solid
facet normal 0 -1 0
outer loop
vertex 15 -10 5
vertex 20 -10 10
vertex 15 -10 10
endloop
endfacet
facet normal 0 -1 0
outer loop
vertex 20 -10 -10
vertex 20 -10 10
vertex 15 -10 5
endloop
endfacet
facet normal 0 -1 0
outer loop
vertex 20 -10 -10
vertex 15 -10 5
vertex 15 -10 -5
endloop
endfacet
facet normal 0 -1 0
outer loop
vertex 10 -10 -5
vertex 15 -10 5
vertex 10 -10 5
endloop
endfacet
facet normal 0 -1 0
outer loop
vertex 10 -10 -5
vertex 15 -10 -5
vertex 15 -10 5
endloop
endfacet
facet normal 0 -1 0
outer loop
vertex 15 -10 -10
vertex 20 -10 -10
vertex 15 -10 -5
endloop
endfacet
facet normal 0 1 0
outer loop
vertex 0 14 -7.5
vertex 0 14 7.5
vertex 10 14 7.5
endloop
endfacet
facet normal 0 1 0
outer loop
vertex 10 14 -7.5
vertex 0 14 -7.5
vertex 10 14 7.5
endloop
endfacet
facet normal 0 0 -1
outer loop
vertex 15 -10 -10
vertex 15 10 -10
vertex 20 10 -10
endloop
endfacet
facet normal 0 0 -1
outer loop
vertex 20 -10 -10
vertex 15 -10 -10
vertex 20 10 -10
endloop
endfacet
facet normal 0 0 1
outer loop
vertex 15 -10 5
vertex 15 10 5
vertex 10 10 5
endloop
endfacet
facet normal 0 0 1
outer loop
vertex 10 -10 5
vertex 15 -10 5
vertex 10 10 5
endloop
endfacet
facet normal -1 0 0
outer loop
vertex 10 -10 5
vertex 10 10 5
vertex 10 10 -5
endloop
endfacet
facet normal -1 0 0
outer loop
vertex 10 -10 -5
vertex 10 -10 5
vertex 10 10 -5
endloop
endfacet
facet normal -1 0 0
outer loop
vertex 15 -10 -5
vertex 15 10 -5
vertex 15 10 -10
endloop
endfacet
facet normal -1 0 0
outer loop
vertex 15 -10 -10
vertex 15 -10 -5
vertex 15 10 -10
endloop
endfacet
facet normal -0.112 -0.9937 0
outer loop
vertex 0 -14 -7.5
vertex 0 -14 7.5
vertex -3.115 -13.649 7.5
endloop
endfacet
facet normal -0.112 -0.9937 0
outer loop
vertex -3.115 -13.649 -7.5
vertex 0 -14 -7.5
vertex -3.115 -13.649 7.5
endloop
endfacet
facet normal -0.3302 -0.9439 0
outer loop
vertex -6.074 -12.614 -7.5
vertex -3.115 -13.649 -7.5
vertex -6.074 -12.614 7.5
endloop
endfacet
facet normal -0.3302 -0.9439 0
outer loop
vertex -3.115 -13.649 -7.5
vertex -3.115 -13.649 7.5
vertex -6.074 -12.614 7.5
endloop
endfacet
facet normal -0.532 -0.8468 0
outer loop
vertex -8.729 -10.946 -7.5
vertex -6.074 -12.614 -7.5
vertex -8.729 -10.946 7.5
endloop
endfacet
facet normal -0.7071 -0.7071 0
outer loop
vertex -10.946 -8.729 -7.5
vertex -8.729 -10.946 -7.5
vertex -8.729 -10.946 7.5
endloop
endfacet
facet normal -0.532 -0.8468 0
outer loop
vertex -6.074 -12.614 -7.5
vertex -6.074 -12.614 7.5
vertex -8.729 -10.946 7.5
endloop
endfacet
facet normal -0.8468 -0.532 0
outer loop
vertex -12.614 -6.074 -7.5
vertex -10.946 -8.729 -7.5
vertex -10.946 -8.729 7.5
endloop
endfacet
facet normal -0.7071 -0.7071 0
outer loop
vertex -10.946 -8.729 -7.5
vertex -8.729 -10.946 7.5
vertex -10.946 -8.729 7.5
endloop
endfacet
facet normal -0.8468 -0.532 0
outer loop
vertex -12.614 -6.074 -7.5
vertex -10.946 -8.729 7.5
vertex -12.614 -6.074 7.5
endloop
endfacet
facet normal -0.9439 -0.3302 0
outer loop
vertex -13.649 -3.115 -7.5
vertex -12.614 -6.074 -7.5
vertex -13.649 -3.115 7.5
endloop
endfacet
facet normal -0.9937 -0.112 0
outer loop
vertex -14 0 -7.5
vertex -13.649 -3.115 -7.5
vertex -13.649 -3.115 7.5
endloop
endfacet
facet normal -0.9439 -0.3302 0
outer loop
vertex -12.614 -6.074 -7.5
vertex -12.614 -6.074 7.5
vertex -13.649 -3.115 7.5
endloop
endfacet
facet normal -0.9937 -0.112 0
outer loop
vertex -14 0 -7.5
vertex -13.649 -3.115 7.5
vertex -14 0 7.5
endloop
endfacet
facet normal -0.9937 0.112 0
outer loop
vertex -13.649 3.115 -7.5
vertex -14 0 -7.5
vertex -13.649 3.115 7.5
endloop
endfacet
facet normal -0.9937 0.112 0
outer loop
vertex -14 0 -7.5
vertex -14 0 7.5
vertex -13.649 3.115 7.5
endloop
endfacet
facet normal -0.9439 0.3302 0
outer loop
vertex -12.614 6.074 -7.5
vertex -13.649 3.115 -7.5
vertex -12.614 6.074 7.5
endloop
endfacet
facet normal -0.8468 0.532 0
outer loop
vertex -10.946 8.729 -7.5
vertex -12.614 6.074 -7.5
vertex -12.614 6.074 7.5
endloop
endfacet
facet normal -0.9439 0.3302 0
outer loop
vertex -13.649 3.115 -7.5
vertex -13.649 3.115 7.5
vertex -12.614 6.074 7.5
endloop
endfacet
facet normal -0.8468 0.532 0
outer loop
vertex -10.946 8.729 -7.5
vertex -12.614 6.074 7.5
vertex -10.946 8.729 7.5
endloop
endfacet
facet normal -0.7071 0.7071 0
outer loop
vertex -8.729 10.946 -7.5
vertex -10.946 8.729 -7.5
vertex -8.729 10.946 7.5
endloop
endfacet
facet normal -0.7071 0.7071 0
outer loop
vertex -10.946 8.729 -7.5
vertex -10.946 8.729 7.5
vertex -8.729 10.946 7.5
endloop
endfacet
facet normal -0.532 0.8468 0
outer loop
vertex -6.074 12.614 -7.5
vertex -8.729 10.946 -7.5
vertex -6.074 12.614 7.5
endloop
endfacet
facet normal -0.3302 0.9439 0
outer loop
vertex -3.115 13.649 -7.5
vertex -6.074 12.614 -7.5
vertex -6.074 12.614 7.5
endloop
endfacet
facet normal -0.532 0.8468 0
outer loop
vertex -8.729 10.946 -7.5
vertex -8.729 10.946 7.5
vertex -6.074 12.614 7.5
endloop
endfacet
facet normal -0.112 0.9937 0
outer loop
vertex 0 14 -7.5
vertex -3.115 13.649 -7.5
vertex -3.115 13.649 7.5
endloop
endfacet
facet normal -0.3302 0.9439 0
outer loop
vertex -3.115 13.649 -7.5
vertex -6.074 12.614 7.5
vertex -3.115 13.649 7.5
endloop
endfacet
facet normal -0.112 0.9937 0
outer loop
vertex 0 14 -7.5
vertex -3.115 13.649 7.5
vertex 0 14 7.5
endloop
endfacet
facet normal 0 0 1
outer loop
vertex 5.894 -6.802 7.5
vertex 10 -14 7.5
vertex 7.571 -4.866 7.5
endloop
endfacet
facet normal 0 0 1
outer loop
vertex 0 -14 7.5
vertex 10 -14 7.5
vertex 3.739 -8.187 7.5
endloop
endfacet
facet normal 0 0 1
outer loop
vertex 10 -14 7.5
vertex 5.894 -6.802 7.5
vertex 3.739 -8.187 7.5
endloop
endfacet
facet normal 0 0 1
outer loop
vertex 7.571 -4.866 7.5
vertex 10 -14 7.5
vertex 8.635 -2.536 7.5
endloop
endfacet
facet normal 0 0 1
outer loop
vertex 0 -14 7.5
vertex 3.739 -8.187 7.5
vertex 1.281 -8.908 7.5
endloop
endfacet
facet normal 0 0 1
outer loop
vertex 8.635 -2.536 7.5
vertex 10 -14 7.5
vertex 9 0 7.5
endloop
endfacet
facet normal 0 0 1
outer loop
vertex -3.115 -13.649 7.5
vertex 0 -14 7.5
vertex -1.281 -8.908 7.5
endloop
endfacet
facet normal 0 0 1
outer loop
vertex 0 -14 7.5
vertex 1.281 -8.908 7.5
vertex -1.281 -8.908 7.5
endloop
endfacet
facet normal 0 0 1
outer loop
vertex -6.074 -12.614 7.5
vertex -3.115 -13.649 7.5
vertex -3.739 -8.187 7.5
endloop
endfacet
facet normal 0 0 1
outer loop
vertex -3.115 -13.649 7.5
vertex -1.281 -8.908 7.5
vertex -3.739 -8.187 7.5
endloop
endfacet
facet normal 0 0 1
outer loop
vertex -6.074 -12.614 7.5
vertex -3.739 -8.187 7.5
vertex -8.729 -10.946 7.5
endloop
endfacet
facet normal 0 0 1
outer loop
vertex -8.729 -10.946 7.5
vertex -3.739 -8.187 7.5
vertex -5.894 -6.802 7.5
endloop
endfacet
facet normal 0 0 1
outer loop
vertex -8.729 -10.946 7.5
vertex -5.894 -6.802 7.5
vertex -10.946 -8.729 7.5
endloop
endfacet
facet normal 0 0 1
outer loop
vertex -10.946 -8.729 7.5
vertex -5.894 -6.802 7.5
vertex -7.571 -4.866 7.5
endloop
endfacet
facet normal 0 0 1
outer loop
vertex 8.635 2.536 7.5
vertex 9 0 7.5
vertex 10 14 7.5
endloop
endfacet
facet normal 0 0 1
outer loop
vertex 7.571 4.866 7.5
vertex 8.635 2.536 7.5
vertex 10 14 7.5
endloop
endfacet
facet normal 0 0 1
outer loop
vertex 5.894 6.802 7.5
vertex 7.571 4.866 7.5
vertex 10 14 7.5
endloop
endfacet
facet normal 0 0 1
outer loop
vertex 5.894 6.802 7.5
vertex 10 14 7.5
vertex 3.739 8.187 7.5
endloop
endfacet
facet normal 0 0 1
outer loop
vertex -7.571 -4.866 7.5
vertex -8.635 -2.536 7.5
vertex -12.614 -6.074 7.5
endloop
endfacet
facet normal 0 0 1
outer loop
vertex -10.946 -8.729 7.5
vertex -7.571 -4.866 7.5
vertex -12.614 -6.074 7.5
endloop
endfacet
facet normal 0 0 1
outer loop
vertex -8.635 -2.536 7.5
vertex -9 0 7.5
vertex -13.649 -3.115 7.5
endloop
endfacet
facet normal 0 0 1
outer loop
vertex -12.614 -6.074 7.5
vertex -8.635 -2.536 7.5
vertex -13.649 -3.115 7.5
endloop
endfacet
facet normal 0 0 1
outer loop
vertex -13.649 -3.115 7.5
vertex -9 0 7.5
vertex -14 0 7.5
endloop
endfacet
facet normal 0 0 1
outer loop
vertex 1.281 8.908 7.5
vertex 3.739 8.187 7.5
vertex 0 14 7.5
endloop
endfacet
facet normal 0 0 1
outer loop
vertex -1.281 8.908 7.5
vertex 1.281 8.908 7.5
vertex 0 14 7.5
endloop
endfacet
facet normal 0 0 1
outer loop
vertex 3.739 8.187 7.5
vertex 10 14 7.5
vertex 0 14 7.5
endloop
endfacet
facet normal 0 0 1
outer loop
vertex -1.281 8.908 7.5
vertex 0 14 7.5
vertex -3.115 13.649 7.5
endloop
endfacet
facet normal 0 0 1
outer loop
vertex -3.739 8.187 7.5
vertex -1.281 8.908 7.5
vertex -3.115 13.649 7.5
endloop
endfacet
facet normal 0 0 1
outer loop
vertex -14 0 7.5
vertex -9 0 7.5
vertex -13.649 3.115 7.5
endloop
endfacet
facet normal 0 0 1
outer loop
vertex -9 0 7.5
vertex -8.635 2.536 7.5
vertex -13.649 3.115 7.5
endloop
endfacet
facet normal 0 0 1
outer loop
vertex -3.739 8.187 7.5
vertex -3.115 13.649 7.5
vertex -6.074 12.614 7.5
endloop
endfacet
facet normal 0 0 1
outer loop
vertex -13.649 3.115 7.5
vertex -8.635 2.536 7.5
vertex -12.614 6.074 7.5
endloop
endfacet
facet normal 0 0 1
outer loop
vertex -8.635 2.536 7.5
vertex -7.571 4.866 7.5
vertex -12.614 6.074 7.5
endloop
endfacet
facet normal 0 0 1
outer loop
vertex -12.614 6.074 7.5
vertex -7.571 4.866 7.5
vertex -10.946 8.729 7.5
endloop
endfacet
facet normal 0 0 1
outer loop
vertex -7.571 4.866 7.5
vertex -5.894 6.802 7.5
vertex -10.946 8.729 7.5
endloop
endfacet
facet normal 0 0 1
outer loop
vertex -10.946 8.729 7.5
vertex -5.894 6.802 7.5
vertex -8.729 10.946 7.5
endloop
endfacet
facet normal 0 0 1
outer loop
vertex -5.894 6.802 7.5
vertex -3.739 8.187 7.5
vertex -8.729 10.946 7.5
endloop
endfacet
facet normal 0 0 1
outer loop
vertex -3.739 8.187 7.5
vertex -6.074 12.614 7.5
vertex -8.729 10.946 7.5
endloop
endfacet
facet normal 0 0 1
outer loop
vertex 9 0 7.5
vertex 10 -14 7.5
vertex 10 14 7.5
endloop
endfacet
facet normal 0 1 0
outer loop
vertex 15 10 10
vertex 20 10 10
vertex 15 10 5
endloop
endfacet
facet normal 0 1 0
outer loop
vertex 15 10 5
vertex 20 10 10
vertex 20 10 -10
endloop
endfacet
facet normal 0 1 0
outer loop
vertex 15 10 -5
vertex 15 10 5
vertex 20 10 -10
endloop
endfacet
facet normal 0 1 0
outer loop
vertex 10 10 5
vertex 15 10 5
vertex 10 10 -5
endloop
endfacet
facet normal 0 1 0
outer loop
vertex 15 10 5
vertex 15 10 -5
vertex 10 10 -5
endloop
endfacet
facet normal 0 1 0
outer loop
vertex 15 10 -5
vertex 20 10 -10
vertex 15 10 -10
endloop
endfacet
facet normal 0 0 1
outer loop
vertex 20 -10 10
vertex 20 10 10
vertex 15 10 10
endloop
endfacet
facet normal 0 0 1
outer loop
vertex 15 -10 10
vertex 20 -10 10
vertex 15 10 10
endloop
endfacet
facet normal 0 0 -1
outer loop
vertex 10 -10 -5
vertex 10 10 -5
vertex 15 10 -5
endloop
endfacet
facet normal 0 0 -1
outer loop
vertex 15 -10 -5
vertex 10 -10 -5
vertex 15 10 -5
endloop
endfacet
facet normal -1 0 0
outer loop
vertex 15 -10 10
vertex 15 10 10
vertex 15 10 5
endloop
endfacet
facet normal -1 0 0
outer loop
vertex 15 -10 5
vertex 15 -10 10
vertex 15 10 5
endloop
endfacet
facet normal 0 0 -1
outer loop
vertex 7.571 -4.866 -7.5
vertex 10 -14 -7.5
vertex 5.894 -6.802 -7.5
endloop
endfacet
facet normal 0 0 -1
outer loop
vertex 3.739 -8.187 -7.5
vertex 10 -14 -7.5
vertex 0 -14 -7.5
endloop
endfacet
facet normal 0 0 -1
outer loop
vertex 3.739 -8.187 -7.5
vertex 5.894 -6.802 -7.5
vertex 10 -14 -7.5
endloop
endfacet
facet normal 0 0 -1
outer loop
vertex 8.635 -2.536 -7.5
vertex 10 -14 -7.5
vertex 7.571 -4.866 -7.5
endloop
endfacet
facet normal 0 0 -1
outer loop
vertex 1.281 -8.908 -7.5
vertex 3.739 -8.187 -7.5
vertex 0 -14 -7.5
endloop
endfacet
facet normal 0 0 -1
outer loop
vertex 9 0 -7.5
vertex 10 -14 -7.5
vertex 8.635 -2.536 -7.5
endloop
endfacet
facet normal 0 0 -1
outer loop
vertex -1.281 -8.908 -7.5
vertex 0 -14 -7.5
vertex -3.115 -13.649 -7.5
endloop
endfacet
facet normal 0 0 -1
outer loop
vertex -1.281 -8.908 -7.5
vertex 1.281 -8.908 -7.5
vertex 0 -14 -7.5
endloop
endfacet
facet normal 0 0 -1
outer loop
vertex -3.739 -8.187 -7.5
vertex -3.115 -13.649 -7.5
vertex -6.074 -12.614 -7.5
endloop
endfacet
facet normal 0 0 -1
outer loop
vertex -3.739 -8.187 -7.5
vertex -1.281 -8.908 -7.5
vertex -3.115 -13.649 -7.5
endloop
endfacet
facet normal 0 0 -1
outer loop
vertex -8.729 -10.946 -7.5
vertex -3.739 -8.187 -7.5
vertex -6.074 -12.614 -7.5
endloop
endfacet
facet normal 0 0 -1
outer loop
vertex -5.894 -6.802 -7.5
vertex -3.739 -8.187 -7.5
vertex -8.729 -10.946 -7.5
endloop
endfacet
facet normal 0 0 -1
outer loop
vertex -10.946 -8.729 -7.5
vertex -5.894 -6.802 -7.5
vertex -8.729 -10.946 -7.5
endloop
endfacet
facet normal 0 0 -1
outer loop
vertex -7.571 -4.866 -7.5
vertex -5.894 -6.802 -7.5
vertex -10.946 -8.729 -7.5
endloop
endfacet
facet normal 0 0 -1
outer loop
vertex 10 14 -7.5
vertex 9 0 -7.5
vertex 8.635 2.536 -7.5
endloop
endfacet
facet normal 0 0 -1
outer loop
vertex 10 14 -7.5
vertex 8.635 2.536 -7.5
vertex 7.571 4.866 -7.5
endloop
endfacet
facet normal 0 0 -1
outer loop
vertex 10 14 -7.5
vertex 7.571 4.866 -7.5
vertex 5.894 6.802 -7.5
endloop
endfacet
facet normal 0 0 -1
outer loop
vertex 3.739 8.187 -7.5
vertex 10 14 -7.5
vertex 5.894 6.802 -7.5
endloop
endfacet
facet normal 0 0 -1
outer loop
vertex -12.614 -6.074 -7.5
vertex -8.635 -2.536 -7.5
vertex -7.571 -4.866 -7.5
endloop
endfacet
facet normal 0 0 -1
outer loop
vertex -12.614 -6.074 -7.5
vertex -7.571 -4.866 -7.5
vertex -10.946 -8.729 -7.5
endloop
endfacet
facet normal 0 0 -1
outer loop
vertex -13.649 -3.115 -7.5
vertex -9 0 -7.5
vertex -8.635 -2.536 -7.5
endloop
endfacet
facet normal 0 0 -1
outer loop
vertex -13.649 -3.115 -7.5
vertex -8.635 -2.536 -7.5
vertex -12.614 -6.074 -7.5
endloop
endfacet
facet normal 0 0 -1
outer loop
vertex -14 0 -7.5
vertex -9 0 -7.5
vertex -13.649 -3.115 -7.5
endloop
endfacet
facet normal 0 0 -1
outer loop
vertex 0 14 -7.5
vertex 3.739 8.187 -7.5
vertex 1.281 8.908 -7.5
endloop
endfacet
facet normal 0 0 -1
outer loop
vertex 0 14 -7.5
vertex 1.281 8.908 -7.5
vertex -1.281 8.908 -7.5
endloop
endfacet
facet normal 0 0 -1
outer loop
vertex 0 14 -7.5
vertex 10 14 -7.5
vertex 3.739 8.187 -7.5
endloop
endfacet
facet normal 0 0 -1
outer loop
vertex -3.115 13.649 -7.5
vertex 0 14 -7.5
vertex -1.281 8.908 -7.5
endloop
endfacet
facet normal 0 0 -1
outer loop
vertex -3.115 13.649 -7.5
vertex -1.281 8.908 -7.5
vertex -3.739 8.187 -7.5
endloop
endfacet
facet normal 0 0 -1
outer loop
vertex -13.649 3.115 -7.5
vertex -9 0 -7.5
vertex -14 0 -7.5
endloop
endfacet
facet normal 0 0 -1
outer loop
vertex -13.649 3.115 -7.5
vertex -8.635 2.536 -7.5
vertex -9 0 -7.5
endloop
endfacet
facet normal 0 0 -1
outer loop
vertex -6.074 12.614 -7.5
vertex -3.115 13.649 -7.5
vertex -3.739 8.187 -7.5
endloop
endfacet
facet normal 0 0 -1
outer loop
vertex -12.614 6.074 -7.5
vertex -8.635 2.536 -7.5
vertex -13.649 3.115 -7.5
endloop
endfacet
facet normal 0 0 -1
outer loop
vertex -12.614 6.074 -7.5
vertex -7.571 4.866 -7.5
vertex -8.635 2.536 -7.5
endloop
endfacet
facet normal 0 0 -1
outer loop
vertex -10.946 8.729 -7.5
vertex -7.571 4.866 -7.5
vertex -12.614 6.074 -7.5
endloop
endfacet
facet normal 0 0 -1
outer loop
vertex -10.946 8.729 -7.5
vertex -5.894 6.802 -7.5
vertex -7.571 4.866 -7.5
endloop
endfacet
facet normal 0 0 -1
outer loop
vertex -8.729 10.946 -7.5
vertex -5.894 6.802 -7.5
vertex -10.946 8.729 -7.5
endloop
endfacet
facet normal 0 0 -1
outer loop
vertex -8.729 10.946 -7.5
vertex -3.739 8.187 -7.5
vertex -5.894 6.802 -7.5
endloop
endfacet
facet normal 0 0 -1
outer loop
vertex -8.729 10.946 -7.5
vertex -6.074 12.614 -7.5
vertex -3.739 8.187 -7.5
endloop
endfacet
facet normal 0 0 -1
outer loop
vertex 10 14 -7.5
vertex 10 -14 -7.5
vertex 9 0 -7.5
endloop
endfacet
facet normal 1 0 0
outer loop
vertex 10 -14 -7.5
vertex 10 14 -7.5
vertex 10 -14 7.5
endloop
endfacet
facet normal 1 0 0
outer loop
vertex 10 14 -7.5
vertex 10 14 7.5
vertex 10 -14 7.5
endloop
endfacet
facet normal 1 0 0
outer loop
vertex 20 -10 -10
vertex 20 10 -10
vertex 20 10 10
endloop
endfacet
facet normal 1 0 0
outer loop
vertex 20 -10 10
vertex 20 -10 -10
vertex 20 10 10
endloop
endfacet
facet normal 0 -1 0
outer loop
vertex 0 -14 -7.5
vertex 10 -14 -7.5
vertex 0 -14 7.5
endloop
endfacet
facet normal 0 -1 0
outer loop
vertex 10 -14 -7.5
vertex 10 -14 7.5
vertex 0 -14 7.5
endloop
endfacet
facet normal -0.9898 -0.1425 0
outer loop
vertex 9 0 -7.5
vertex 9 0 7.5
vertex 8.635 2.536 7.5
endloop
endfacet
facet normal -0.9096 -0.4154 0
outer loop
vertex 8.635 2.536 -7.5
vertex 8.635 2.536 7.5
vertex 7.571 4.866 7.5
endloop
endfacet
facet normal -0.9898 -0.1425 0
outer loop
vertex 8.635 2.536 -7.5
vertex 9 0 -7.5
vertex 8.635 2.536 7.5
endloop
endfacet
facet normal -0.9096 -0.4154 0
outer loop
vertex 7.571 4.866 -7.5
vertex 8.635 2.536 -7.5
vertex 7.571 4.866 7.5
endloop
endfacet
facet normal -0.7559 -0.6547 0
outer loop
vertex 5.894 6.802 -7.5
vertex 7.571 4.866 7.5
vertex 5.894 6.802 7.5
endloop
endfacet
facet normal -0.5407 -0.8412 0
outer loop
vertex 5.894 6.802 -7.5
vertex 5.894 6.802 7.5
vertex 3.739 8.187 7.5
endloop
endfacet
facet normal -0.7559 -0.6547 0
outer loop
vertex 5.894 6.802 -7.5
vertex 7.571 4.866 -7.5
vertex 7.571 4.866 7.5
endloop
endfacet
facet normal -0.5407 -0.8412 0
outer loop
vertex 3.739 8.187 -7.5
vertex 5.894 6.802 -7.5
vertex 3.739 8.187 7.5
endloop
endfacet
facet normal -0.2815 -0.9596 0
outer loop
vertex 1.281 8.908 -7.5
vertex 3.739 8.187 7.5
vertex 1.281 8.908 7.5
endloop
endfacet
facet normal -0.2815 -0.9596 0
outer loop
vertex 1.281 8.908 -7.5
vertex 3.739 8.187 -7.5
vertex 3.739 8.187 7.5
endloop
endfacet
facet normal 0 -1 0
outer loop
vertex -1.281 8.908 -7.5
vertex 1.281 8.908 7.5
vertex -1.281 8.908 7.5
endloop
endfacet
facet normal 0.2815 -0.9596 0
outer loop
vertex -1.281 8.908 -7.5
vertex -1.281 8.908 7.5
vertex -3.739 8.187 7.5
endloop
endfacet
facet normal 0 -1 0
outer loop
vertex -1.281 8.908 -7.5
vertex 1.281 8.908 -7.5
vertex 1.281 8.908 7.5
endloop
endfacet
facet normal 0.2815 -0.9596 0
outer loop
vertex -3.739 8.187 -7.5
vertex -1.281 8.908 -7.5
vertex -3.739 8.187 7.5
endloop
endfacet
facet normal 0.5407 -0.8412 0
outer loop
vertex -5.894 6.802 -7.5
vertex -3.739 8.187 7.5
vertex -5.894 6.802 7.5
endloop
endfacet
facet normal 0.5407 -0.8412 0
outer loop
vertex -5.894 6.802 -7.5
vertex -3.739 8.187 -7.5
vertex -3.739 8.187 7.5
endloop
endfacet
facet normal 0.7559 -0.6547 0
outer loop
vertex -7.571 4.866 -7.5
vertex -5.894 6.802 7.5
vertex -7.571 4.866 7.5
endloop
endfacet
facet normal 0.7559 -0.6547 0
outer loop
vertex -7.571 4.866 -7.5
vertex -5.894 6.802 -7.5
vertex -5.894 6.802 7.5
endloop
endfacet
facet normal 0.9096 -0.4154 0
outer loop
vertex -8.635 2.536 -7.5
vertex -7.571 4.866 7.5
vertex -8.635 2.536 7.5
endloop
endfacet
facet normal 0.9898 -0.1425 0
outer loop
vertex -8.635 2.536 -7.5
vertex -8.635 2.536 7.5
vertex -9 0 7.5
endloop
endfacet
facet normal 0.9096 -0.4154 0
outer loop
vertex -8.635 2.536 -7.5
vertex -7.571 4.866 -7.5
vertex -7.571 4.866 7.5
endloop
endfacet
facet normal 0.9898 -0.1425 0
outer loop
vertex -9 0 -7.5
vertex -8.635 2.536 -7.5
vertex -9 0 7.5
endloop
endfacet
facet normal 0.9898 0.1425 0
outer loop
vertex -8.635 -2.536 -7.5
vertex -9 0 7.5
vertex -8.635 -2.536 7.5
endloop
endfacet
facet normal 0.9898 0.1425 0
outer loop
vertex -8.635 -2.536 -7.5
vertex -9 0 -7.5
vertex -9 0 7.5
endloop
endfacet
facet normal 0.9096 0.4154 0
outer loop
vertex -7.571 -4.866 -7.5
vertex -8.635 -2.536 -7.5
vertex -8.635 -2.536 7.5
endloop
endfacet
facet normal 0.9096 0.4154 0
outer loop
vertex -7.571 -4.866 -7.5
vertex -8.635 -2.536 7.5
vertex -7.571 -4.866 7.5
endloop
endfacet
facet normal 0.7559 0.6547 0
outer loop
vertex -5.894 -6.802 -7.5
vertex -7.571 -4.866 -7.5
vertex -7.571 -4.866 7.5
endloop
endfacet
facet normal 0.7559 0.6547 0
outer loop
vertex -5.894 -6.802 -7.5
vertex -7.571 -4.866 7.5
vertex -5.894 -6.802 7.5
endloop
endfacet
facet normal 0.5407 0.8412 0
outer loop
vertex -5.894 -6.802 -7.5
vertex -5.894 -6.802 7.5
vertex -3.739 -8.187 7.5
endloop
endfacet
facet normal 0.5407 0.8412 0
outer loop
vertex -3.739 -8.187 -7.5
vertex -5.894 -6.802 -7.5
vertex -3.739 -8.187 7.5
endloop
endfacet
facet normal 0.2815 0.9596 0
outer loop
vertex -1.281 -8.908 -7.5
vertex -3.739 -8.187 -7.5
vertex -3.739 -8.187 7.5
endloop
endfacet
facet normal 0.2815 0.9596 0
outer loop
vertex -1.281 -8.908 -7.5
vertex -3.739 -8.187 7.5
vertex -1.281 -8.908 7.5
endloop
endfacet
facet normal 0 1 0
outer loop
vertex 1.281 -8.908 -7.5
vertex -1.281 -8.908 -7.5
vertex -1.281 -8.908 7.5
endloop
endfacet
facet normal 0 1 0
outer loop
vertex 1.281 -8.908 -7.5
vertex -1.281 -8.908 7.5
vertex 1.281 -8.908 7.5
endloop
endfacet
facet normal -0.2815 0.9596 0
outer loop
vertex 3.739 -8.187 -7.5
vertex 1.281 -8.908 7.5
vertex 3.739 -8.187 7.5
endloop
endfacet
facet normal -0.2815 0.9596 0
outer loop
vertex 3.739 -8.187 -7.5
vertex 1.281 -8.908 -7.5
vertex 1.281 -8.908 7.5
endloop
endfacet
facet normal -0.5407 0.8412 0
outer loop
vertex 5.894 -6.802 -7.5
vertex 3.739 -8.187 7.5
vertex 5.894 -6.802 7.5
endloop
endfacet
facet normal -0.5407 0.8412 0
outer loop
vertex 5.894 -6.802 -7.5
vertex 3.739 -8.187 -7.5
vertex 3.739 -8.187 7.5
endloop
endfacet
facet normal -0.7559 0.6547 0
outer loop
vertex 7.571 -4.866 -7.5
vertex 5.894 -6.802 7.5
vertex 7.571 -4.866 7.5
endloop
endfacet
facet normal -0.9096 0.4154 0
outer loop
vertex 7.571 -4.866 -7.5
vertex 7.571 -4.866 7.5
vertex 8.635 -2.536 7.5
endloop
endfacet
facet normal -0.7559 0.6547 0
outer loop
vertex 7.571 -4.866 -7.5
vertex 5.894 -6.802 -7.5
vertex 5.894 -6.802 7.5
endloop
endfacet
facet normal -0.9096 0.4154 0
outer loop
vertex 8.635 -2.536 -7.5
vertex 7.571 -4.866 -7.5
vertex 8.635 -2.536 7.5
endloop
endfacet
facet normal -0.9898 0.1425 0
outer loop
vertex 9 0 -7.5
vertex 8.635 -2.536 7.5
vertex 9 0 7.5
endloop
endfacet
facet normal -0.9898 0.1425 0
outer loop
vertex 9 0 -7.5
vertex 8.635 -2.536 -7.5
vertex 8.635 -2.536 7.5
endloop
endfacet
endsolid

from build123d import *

# Parameters (mm, degrees)
ESQUISSE1_R        = 9
BOSS_EXTRU_1_DEPTH = 7.5
BOSS_EXTRU_2_START = -4
BOSS_EXTRU_2_DEPTH = 20


with BuildPart() as part:
    # Esquisse1 → Boss.-Extru.1 (new body, symmetric)
    with BuildSketch(Plane.XY):
        with BuildLine():
            Line((0, 14), (10, 14))
            Line((10, 14), (10, -14))
            Line((10, -14), (0, -14))
            ThreePointArc((0, -14), (-14, 0), (0, 14))
        make_face()
        Circle(ESQUISSE1_R, mode=Mode.SUBTRACT)
    extrude(amount=BOSS_EXTRU_1_DEPTH, both=True)


with BuildPart() as body_2:
    # Esquisse2 → Boss.-Extru.2 (new body)
    with BuildSketch(Plane(origin=(0, 14, 0), x_dir=(1, 0, 0), z_dir=(0, 1, 0)).offset(BOSS_EXTRU_2_START)):
        Polygon((10, 5), (15, 5), (15, 10), (20, 10), (20, -10), (15, -10), (15, -5), (10, -5), align=None)
    extrude(amount=-BOSS_EXTRU_2_DEPTH)


solid = Compound([part.part, body_2.part])
